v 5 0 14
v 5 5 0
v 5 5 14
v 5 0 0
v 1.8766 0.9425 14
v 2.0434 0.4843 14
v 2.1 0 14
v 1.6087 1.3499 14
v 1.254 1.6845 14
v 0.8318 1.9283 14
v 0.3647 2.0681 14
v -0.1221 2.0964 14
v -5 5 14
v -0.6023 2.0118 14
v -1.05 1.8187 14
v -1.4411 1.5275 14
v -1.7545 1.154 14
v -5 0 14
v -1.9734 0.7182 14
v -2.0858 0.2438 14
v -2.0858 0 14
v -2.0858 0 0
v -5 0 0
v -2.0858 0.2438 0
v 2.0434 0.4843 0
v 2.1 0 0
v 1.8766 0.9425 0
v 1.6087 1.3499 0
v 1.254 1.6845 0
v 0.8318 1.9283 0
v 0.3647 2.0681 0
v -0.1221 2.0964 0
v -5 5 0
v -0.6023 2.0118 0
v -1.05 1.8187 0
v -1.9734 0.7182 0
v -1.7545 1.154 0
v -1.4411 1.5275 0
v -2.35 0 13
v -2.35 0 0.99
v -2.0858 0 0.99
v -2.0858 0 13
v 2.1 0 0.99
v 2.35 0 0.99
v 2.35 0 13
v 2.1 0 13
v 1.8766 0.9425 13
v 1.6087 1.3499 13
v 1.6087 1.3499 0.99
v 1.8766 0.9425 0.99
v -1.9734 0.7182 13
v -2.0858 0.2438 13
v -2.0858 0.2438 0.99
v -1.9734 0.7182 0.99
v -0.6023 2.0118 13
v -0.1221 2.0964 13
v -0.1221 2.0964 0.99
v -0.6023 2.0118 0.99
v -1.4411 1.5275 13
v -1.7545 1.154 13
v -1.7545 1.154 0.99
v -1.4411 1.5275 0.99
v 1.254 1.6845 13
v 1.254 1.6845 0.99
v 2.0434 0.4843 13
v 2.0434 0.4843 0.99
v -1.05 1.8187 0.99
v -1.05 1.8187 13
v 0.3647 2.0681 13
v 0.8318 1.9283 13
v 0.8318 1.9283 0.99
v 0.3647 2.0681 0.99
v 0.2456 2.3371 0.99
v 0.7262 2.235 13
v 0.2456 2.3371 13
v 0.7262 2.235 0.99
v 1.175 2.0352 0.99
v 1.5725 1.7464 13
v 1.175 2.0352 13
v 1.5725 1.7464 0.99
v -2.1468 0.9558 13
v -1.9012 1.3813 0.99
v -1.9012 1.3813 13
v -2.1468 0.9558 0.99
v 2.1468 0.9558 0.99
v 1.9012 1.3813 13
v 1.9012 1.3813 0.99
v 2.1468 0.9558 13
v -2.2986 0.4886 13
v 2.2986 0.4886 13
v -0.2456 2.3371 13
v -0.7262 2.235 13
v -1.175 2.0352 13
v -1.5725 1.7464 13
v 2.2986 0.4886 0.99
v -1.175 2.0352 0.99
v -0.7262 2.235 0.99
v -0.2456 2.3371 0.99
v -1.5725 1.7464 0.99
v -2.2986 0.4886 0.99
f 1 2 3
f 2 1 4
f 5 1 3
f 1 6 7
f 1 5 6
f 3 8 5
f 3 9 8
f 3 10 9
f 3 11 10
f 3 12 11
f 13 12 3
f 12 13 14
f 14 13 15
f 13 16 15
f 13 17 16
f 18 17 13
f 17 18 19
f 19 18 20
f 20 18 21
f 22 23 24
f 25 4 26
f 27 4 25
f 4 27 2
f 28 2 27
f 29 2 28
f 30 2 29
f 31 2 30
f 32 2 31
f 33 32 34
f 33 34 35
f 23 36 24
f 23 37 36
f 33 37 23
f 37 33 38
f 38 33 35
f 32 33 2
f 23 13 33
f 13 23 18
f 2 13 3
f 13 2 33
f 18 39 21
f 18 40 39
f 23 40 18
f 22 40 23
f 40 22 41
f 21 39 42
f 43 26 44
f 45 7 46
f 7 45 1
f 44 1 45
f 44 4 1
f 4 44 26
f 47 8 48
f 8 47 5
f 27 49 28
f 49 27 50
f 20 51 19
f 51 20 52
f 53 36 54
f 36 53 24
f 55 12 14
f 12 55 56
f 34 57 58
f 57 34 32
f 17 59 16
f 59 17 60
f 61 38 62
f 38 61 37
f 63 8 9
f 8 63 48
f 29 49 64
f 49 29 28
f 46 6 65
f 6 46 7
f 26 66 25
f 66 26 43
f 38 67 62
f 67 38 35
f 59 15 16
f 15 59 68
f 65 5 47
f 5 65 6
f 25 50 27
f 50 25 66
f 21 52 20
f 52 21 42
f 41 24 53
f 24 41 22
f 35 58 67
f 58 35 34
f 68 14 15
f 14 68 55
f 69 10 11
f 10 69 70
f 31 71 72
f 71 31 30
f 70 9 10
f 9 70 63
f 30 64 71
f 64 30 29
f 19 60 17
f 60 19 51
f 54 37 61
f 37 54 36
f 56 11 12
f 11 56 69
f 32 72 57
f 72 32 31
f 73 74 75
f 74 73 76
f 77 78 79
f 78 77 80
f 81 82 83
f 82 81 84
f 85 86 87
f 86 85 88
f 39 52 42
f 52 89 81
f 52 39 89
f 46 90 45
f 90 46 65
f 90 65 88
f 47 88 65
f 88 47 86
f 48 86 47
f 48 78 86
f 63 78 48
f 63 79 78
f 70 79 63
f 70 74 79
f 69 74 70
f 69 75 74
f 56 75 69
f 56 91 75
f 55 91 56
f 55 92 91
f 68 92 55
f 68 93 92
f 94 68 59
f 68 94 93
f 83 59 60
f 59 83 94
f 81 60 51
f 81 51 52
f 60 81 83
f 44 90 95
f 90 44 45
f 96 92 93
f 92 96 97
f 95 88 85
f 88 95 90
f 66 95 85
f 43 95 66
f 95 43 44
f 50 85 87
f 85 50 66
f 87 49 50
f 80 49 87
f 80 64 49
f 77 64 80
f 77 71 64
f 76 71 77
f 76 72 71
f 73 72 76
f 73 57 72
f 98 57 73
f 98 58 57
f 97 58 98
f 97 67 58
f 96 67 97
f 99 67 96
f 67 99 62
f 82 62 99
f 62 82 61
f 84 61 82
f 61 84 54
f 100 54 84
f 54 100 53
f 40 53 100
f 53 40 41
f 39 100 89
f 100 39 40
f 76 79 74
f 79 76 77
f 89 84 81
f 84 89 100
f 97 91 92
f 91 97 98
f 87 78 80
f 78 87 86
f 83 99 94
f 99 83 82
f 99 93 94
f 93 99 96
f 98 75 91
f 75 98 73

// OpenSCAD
// file: rgb_strip_to_fiber.scad
leds_per_meter = 60;
led_size = 5;
led_strip_width = 10;
led_strip_thickness = 2;

ferrule_dia = 6;
ferrule_depth = 12;
ferrule_insulation_dia = 10;
ferrule_insulation_height = 10;
ferrule_lip = [0.5, 1]; // ferrule wall thickness is 0.2

registration_block_size = [10, 10, 14];
registration_block_lip = 2;
block_to_led = 5;

part_spacing = 0.2;
wall_thickness = 1.5;

m3_hole_size = 3.3;

$fa=0.5;
$fs=0.5;


/////// computed
led_stride = 1000/leds_per_meter;


smidge = 0.01;

module mockup(explode=0, half=0) {
  translate([0, explode * 10, 0])
    strip_base(3);
  if (!half)
    translate([0, explode * -10, 0])
      mirror([0, 1, 0])
        strip_base(3);

  translate([0, 0, -block_to_led])
    led_strip(3);
      translate([0 * led_stride, 0, 0])
        for (x = [0, half ? 0 : 1])
          rotate([0, 0, 90 + 180 * x])
            translate([0, max(0, explode * 5 - 2.5), 0])
              registration_block_awg_10(registration_block_size);

      translate([1 * led_stride, 0, 0])
        for (x = [0, half ? 0 : 1])
          rotate([0, 0, 90 + 180 * x])
            translate([0, max(0, explode * 5 - 2.5), 0])
              registration_block_awg_12(registration_block_size);

      translate([2 * led_stride, 0, 0])
        for (x = [0, half ? 0 : 1])
          rotate([0, 0, 90 + 180 * x])
            translate([0, max(0, explode * 5 - 2.5), 0])
              registration_block_awg_14(registration_block_size);
}

module strip_base(count) {
  registration_block_cutout = [registration_block_size.y + part_spacing,
                               registration_block_size.x + part_spacing,
                               registration_block_size.z + part_spacing];
  side_inset = 10;
  led_strip_cutout = led_strip_width + 1;

  housing_size = [(count -1) * led_stride + registration_block_cutout.x + wall_thickness * 2,
                  registration_block_cutout.y/2 + wall_thickness,
                  registration_block_cutout.z + wall_thickness * 2 + block_to_led];

  led_cutout = registration_block_size.x - registration_block_lip;

  difference() {
    translate([-registration_block_cutout.x/2 - wall_thickness, 0, -wall_thickness - block_to_led])
      cube(housing_size);

    for (i = [0 : count - 1])
      translate([i * led_stride, 0, 0]) {
        registration_block_base(registration_block_cutout);
        translate([-led_cutout/2,-led_cutout/2, -block_to_led + smidge])
          cube([led_cutout, led_cutout, block_to_led]);
        translate([-led_cutout/2,-led_cutout/2, registration_block_cutout.z - smidge])
          cube([led_cutout, led_cutout, wall_thickness + smidge * 2]);
      }

    translate([-registration_block_cutout.x/2 - wall_thickness - smidge,
               -led_strip_cutout/2,
               -block_to_led -0])
      cube([housing_size.x + smidge * 2, led_strip_cutout, led_strip_thickness]);

    for (i = [0 : count - 2])
      translate([i * led_stride + led_stride/2, -smidge, registration_block_cutout.z/2]) {
        rotate([-90, 0, 0])
        cylinder(d=m3_hole_size, h=housing_size.y + smidge * 2);
      }

  }
}


// max 3 1mm fibers
module registration_block_awg_18(block_size=registration_block_size) {
  registration_block(block_size, 2.2, 12);
}

// max 3 1mm fibers
module registration_block_awg_14(block_size=registration_block_size) {
  registration_block(block_size, 2.2, 12);
}

// max 5 1mm fibers
module registration_block_awg_12(block_size=registration_block_size) {
  registration_block(block_size, 2.8, 12);
}

// max 7 1mm fibers
module registration_block_awg_10(block_size=registration_block_size) {
  registration_block(block_size, 4.7, 12);
}

module registration_block(block_size, ferrule_dia, ferrule_length) {
  difference() {
    intersection() {
      registration_block_base(block_size);
      translate([-block_size.x/2, 0])
        cube(block_size);
    }

    translate([0, 0, -smidge]) {
      cylinder(d=ferrule_dia - ferrule_lip.x, h=block_size.z + smidge * 2);
      translate([0, 0, ferrule_lip.y])
        cylinder(d=ferrule_dia, h=ferrule_length + smidge);
    }
  }
}

module registration_block_base(size) {
  translate([-size.x/2, -size.y/2])
    cube(size);
}

module ferrule_insulated() {
  taper_height = 2;

  translate([0, 0, -ferrule_depth])
    cylinder(d=ferrule_dia, h=ferrule_depth);

  translate([0, 0, taper_height])
    cylinder(d=ferrule_insulation_dia, h=ferrule_insulation_height-taper_height);
  cylinder(d1=ferrule_dia, d2=ferrule_insulation_dia, h=taper_height);

}

module led_strip(count) {
  translate([0, 0, 1]) {
  color("#fefefe")
  for (i = [0 : count - 1])
    translate([i * led_stride, 0, 0]) {
      translate([-led_size/2, -led_size/2, 0])
        cube([led_size, led_size, 2]);
    }

  color("#fcfcfc")
  translate([-led_stride/2, -led_strip_width/2, -1])
  cube([led_stride * count, led_strip_width, 1]);
  }
}
// main file
use <rgb_strip_to_fiber.scad>

registration_block_awg_10();
